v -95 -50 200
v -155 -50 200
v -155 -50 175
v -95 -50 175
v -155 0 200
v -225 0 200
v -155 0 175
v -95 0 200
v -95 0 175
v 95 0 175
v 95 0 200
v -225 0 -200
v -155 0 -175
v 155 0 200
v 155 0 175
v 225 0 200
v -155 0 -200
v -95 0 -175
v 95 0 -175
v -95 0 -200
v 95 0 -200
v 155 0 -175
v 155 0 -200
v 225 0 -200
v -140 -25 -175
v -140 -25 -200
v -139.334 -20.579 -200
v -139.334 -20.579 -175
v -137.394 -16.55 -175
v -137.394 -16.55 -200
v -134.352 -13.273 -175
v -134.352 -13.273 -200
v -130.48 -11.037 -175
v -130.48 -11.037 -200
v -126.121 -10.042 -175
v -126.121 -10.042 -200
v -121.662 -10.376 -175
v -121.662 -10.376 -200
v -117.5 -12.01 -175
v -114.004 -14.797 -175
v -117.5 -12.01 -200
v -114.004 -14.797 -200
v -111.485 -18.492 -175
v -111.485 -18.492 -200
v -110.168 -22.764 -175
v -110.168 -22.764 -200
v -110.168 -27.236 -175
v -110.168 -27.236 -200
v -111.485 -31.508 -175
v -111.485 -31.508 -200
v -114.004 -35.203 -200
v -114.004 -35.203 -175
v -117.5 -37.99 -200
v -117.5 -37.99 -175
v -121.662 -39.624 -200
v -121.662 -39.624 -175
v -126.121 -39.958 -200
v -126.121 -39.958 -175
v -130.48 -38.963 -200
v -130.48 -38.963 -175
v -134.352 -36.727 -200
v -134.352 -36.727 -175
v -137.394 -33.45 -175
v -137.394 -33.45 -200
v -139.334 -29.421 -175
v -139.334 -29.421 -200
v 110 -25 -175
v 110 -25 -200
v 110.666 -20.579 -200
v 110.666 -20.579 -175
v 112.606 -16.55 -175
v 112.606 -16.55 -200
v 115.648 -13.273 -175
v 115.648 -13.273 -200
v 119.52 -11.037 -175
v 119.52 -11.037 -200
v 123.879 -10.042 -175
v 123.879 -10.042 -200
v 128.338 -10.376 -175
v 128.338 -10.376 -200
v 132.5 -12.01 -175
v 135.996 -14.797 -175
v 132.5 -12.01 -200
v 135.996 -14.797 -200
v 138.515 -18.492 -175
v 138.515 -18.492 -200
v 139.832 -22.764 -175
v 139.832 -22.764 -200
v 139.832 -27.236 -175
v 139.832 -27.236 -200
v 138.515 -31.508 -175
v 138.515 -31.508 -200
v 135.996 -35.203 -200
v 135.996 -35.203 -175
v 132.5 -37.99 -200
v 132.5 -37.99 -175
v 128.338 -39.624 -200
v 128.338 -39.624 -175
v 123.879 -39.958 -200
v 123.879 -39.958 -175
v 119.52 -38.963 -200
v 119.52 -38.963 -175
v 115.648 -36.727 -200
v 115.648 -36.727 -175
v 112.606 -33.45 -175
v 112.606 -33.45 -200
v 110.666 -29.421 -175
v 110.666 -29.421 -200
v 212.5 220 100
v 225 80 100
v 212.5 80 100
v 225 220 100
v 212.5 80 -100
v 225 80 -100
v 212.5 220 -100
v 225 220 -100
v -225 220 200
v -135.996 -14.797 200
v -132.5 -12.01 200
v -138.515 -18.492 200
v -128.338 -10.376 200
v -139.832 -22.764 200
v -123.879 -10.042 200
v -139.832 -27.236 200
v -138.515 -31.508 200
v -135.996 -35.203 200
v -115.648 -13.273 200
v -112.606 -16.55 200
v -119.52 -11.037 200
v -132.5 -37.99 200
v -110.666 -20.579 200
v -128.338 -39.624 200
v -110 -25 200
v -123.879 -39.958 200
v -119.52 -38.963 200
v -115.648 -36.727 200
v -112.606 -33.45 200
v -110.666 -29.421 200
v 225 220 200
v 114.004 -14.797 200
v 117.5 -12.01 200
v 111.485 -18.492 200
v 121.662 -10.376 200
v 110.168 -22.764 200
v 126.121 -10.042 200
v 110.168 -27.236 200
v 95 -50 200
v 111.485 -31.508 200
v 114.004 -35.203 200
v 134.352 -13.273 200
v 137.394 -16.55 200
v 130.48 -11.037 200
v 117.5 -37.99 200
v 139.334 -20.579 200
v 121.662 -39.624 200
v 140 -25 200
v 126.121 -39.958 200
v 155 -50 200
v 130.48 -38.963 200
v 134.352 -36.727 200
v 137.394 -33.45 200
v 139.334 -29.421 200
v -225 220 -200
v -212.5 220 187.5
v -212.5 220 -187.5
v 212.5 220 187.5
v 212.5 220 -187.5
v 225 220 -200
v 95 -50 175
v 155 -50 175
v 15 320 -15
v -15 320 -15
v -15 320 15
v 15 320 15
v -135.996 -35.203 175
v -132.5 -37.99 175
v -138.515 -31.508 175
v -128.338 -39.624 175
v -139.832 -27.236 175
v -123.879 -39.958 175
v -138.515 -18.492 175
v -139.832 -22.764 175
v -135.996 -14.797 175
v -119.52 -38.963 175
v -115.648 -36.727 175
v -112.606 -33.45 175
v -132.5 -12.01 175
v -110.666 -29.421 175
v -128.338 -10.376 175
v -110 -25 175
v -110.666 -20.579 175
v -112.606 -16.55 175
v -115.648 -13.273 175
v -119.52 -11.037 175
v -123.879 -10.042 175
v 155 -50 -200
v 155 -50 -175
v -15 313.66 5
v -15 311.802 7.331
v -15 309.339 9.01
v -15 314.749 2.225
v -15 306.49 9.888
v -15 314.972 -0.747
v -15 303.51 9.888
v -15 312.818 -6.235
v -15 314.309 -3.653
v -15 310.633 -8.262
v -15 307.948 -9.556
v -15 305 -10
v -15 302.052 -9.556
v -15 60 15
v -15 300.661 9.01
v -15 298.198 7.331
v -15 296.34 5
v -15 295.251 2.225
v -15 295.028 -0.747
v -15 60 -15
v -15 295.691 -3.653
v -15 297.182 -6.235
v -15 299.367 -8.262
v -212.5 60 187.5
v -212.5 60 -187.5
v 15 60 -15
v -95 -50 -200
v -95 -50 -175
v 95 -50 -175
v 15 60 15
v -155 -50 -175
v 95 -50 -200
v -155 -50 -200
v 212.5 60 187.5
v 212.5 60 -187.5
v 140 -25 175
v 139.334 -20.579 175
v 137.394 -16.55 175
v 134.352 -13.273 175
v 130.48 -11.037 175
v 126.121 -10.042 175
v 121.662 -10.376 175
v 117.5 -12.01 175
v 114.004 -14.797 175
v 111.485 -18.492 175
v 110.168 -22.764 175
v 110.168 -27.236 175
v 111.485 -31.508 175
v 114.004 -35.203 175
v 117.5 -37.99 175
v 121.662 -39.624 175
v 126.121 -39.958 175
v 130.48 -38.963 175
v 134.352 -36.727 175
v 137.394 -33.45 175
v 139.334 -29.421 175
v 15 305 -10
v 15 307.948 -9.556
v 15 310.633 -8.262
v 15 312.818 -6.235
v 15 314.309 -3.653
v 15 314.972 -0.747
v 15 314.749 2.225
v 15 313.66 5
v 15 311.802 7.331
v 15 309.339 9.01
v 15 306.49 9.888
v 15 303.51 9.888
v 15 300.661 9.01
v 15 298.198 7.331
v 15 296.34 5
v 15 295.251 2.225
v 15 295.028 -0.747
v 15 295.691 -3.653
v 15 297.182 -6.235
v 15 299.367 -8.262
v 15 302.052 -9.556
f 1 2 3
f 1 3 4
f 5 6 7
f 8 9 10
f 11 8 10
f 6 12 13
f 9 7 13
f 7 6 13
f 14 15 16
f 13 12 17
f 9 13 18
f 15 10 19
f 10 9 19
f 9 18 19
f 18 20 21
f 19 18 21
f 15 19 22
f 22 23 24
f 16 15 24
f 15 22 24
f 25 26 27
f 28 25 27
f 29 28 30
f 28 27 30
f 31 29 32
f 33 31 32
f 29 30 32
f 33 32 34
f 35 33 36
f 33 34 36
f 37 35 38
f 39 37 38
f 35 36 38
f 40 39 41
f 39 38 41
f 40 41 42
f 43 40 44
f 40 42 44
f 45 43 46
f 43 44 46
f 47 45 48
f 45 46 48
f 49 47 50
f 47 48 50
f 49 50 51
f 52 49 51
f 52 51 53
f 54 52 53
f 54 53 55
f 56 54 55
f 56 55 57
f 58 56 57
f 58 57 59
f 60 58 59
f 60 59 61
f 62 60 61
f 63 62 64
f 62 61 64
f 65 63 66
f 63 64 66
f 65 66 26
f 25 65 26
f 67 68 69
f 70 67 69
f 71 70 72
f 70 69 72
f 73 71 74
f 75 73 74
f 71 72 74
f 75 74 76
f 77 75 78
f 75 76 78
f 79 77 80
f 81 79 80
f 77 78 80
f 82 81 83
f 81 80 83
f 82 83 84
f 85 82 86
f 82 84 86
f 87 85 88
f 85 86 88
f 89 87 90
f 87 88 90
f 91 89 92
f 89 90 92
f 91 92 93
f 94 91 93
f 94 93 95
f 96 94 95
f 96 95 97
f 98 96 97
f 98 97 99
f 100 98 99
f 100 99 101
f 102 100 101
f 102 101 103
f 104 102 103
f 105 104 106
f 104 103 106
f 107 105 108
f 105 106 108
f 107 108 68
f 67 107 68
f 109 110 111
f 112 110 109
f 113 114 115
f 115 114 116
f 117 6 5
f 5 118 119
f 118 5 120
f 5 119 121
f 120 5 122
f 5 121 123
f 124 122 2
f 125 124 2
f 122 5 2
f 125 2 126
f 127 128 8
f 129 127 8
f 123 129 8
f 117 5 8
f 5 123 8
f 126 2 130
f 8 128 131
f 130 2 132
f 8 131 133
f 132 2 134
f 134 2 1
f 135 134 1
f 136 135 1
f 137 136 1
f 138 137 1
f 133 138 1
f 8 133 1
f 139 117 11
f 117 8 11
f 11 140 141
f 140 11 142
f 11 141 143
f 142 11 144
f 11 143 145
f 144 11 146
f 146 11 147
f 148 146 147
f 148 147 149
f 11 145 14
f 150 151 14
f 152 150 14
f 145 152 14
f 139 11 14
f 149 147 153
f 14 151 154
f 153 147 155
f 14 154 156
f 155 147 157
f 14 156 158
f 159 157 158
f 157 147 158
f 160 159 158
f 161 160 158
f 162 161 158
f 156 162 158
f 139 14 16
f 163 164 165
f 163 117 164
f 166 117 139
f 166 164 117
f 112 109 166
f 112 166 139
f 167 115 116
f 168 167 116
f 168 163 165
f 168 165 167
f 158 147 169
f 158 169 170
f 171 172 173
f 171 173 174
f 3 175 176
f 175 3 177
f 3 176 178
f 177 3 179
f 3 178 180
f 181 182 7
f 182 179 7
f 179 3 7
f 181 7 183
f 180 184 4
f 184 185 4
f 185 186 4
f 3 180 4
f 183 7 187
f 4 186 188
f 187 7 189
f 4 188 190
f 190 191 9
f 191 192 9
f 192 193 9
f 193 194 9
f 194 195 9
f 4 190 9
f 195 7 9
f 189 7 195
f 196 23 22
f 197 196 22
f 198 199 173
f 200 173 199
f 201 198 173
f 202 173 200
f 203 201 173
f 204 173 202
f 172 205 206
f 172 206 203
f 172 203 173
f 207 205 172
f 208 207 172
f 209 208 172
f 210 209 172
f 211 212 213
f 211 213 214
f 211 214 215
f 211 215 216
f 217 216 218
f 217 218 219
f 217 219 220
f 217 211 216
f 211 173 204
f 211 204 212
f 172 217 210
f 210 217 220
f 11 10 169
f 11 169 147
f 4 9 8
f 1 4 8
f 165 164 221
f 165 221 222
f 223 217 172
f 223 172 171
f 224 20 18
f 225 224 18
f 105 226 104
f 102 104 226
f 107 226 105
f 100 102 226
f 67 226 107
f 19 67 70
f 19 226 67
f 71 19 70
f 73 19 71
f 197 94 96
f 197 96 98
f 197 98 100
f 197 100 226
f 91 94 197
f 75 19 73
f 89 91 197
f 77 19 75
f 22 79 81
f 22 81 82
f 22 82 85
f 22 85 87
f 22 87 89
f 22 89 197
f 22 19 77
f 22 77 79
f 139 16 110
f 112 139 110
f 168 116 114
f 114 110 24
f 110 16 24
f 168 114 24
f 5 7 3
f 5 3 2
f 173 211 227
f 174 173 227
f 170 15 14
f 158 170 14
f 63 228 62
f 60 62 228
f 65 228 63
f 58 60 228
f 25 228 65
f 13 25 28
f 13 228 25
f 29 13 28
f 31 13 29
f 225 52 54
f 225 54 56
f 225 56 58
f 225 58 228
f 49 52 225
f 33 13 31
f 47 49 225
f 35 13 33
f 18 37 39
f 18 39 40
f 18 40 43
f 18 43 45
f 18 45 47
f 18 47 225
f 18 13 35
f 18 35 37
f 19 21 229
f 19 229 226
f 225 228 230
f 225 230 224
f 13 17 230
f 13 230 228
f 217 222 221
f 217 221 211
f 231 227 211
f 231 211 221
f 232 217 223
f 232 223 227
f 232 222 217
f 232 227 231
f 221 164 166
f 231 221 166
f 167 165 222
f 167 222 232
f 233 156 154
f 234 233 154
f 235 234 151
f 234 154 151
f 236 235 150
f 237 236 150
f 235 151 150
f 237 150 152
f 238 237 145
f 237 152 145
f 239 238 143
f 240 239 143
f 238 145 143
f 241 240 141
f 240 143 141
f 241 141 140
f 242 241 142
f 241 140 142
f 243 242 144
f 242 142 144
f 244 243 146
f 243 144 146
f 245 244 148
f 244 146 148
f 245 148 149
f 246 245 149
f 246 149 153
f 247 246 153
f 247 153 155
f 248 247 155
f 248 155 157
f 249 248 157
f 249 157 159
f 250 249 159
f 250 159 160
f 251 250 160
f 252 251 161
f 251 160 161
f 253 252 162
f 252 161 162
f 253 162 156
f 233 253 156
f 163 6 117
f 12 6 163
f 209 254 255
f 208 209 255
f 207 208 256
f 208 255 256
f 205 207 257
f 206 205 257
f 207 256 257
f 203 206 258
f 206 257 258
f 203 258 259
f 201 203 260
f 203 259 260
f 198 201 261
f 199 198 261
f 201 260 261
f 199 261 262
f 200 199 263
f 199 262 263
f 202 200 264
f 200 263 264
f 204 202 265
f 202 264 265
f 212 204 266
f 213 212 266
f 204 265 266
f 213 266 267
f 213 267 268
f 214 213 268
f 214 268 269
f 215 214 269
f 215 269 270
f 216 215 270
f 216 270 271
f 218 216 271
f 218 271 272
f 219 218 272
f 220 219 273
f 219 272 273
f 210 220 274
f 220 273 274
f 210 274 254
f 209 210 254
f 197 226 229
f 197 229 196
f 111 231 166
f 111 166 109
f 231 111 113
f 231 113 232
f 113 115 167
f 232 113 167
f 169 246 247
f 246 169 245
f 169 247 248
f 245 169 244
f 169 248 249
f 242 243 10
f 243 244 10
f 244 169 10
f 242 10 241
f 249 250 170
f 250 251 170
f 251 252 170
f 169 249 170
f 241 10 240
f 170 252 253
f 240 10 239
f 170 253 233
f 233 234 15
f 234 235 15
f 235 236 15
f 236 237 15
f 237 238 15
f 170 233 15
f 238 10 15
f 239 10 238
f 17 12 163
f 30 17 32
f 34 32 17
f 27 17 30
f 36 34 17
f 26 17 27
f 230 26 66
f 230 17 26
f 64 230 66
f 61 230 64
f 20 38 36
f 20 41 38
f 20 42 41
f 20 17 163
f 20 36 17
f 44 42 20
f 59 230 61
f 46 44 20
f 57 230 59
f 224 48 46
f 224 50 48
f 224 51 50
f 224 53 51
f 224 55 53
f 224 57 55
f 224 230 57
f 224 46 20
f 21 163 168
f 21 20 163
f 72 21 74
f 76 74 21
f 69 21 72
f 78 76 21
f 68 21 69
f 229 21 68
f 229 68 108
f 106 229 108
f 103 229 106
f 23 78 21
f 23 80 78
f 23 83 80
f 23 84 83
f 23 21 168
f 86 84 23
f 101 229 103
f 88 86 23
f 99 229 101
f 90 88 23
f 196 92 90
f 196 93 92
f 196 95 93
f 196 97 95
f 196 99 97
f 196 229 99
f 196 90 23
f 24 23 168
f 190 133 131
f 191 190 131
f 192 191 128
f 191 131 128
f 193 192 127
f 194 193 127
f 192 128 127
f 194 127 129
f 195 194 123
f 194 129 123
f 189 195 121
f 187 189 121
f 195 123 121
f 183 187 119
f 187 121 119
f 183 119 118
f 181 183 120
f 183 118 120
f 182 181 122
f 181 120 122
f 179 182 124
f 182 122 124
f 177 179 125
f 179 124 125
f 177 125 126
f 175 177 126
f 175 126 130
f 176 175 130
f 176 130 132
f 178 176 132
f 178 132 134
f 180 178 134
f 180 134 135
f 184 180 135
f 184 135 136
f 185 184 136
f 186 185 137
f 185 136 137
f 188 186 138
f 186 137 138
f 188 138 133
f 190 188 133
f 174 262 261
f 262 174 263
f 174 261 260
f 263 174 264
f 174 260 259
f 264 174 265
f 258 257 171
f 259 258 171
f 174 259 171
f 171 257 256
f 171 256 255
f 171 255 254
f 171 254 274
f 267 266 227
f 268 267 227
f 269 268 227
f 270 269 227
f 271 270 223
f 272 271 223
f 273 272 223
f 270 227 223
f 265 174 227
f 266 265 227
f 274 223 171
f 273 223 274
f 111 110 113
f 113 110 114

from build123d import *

# Parameters (mm, degrees)
SKETCH1_W           = 450
SKETCH1_H           = 400
BOSS_EXTRUDE1_DEPTH = 220
SKETCH2_W           = 425
SKETCH2_H           = 375
CUT_EXTRUDE1_DEPTH  = 160
SKETCH3_W           = 200
SKETCH3_H           = 140
CUT_EXTRUDE2_DEPTH  = 12.5
SKETCH4_W           = 30
SKETCH4_H           = 30
BOSS_EXTRUDE2_DEPTH = 260
SKETCH5_R           = 10
CUT_EXTRUDE3_DEPTH  = 30
SKETCH6_W           = 60
SKETCH6_H           = 25
BOSS_EXTRUDE3_DEPTH = 50
SKETCH7_R           = 15
CUT_EXTRUDE4_DEPTH  = 25
SKETCH8_R           = 15
CUT_EXTRUDE5_DEPTH  = 25


with BuildPart() as part:
    # Sketch1 → Boss-Extrude1 (new body)
    with BuildSketch(Plane(origin=(0, 0, 0), x_dir=(1, 0, 0), z_dir=(0, 1, 0))):
        Rectangle(SKETCH1_W, SKETCH1_H)
    extrude(amount=BOSS_EXTRUDE1_DEPTH)

    # Sketch2 → Cut-Extrude1 (cut)
    with BuildSketch(Plane(origin=(0, 220, 0), x_dir=(1, 0, 0), z_dir=(0, 1, 0))):
        Rectangle(SKETCH2_W, SKETCH2_H)
    extrude(amount=-CUT_EXTRUDE1_DEPTH, mode=Mode.SUBTRACT)

    # Sketch3 → Cut-Extrude2 (cut)
    with BuildSketch(Plane(origin=(225, 0, 0), x_dir=(0, 0, -1), z_dir=(1, 0, 0))):
        with Locations((0, 150)):
            Rectangle(SKETCH3_W, SKETCH3_H)
    extrude(amount=-CUT_EXTRUDE2_DEPTH, mode=Mode.SUBTRACT)

    # Sketch4 → Boss-Extrude2 (add)
    with BuildSketch(Plane(origin=(0, 60, 0), x_dir=(1, 0, 0), z_dir=(0, 1, 0))):
        Rectangle(SKETCH4_W, SKETCH4_H)
    extrude(amount=BOSS_EXTRUDE2_DEPTH)

    # Sketch5 → Cut-Extrude3 (cut)
    with BuildSketch(Plane(origin=(15, 0, 0), x_dir=(0, 0, -1), z_dir=(1, 0, 0))):
        with Locations((0, 305)):
            Circle(SKETCH5_R)
    extrude(amount=-CUT_EXTRUDE3_DEPTH, mode=Mode.SUBTRACT)

    # Sketch6 → Boss-Extrude3 (add)
    with BuildSketch(Plane.XZ):
        with Locations((125, 187.5)):
            Rectangle(SKETCH6_W, SKETCH6_H)
        with Locations((-125, 187.5)):
            Rectangle(SKETCH6_W, SKETCH6_H)
        with Locations((-125, -187.5)):
            Rectangle(SKETCH6_W, SKETCH6_H)
        with Locations((125, -187.5)):
            Rectangle(SKETCH6_W, SKETCH6_H)
    extrude(amount=BOSS_EXTRUDE3_DEPTH)

    # Sketch7 → Cut-Extrude4 (cut)
    with BuildSketch(Plane(origin=(0, 0, -200), x_dir=(-1, 0, 0), z_dir=(0, 0, -1))):
        with Locations((125, -25)):
            Circle(SKETCH7_R)
        with Locations((-125, -25)):
            Circle(SKETCH7_R)
    extrude(amount=-CUT_EXTRUDE4_DEPTH, mode=Mode.SUBTRACT)

    # Sketch8 → Cut-Extrude5 (cut)
    with BuildSketch(Plane.XY.offset(200)):
        with Locations((-125, -25)):
            Circle(SKETCH8_R)
        with Locations((125, -25)):
            Circle(SKETCH8_R)
    extrude(amount=-CUT_EXTRUDE5_DEPTH, mode=Mode.SUBTRACT)


solid = part.part
